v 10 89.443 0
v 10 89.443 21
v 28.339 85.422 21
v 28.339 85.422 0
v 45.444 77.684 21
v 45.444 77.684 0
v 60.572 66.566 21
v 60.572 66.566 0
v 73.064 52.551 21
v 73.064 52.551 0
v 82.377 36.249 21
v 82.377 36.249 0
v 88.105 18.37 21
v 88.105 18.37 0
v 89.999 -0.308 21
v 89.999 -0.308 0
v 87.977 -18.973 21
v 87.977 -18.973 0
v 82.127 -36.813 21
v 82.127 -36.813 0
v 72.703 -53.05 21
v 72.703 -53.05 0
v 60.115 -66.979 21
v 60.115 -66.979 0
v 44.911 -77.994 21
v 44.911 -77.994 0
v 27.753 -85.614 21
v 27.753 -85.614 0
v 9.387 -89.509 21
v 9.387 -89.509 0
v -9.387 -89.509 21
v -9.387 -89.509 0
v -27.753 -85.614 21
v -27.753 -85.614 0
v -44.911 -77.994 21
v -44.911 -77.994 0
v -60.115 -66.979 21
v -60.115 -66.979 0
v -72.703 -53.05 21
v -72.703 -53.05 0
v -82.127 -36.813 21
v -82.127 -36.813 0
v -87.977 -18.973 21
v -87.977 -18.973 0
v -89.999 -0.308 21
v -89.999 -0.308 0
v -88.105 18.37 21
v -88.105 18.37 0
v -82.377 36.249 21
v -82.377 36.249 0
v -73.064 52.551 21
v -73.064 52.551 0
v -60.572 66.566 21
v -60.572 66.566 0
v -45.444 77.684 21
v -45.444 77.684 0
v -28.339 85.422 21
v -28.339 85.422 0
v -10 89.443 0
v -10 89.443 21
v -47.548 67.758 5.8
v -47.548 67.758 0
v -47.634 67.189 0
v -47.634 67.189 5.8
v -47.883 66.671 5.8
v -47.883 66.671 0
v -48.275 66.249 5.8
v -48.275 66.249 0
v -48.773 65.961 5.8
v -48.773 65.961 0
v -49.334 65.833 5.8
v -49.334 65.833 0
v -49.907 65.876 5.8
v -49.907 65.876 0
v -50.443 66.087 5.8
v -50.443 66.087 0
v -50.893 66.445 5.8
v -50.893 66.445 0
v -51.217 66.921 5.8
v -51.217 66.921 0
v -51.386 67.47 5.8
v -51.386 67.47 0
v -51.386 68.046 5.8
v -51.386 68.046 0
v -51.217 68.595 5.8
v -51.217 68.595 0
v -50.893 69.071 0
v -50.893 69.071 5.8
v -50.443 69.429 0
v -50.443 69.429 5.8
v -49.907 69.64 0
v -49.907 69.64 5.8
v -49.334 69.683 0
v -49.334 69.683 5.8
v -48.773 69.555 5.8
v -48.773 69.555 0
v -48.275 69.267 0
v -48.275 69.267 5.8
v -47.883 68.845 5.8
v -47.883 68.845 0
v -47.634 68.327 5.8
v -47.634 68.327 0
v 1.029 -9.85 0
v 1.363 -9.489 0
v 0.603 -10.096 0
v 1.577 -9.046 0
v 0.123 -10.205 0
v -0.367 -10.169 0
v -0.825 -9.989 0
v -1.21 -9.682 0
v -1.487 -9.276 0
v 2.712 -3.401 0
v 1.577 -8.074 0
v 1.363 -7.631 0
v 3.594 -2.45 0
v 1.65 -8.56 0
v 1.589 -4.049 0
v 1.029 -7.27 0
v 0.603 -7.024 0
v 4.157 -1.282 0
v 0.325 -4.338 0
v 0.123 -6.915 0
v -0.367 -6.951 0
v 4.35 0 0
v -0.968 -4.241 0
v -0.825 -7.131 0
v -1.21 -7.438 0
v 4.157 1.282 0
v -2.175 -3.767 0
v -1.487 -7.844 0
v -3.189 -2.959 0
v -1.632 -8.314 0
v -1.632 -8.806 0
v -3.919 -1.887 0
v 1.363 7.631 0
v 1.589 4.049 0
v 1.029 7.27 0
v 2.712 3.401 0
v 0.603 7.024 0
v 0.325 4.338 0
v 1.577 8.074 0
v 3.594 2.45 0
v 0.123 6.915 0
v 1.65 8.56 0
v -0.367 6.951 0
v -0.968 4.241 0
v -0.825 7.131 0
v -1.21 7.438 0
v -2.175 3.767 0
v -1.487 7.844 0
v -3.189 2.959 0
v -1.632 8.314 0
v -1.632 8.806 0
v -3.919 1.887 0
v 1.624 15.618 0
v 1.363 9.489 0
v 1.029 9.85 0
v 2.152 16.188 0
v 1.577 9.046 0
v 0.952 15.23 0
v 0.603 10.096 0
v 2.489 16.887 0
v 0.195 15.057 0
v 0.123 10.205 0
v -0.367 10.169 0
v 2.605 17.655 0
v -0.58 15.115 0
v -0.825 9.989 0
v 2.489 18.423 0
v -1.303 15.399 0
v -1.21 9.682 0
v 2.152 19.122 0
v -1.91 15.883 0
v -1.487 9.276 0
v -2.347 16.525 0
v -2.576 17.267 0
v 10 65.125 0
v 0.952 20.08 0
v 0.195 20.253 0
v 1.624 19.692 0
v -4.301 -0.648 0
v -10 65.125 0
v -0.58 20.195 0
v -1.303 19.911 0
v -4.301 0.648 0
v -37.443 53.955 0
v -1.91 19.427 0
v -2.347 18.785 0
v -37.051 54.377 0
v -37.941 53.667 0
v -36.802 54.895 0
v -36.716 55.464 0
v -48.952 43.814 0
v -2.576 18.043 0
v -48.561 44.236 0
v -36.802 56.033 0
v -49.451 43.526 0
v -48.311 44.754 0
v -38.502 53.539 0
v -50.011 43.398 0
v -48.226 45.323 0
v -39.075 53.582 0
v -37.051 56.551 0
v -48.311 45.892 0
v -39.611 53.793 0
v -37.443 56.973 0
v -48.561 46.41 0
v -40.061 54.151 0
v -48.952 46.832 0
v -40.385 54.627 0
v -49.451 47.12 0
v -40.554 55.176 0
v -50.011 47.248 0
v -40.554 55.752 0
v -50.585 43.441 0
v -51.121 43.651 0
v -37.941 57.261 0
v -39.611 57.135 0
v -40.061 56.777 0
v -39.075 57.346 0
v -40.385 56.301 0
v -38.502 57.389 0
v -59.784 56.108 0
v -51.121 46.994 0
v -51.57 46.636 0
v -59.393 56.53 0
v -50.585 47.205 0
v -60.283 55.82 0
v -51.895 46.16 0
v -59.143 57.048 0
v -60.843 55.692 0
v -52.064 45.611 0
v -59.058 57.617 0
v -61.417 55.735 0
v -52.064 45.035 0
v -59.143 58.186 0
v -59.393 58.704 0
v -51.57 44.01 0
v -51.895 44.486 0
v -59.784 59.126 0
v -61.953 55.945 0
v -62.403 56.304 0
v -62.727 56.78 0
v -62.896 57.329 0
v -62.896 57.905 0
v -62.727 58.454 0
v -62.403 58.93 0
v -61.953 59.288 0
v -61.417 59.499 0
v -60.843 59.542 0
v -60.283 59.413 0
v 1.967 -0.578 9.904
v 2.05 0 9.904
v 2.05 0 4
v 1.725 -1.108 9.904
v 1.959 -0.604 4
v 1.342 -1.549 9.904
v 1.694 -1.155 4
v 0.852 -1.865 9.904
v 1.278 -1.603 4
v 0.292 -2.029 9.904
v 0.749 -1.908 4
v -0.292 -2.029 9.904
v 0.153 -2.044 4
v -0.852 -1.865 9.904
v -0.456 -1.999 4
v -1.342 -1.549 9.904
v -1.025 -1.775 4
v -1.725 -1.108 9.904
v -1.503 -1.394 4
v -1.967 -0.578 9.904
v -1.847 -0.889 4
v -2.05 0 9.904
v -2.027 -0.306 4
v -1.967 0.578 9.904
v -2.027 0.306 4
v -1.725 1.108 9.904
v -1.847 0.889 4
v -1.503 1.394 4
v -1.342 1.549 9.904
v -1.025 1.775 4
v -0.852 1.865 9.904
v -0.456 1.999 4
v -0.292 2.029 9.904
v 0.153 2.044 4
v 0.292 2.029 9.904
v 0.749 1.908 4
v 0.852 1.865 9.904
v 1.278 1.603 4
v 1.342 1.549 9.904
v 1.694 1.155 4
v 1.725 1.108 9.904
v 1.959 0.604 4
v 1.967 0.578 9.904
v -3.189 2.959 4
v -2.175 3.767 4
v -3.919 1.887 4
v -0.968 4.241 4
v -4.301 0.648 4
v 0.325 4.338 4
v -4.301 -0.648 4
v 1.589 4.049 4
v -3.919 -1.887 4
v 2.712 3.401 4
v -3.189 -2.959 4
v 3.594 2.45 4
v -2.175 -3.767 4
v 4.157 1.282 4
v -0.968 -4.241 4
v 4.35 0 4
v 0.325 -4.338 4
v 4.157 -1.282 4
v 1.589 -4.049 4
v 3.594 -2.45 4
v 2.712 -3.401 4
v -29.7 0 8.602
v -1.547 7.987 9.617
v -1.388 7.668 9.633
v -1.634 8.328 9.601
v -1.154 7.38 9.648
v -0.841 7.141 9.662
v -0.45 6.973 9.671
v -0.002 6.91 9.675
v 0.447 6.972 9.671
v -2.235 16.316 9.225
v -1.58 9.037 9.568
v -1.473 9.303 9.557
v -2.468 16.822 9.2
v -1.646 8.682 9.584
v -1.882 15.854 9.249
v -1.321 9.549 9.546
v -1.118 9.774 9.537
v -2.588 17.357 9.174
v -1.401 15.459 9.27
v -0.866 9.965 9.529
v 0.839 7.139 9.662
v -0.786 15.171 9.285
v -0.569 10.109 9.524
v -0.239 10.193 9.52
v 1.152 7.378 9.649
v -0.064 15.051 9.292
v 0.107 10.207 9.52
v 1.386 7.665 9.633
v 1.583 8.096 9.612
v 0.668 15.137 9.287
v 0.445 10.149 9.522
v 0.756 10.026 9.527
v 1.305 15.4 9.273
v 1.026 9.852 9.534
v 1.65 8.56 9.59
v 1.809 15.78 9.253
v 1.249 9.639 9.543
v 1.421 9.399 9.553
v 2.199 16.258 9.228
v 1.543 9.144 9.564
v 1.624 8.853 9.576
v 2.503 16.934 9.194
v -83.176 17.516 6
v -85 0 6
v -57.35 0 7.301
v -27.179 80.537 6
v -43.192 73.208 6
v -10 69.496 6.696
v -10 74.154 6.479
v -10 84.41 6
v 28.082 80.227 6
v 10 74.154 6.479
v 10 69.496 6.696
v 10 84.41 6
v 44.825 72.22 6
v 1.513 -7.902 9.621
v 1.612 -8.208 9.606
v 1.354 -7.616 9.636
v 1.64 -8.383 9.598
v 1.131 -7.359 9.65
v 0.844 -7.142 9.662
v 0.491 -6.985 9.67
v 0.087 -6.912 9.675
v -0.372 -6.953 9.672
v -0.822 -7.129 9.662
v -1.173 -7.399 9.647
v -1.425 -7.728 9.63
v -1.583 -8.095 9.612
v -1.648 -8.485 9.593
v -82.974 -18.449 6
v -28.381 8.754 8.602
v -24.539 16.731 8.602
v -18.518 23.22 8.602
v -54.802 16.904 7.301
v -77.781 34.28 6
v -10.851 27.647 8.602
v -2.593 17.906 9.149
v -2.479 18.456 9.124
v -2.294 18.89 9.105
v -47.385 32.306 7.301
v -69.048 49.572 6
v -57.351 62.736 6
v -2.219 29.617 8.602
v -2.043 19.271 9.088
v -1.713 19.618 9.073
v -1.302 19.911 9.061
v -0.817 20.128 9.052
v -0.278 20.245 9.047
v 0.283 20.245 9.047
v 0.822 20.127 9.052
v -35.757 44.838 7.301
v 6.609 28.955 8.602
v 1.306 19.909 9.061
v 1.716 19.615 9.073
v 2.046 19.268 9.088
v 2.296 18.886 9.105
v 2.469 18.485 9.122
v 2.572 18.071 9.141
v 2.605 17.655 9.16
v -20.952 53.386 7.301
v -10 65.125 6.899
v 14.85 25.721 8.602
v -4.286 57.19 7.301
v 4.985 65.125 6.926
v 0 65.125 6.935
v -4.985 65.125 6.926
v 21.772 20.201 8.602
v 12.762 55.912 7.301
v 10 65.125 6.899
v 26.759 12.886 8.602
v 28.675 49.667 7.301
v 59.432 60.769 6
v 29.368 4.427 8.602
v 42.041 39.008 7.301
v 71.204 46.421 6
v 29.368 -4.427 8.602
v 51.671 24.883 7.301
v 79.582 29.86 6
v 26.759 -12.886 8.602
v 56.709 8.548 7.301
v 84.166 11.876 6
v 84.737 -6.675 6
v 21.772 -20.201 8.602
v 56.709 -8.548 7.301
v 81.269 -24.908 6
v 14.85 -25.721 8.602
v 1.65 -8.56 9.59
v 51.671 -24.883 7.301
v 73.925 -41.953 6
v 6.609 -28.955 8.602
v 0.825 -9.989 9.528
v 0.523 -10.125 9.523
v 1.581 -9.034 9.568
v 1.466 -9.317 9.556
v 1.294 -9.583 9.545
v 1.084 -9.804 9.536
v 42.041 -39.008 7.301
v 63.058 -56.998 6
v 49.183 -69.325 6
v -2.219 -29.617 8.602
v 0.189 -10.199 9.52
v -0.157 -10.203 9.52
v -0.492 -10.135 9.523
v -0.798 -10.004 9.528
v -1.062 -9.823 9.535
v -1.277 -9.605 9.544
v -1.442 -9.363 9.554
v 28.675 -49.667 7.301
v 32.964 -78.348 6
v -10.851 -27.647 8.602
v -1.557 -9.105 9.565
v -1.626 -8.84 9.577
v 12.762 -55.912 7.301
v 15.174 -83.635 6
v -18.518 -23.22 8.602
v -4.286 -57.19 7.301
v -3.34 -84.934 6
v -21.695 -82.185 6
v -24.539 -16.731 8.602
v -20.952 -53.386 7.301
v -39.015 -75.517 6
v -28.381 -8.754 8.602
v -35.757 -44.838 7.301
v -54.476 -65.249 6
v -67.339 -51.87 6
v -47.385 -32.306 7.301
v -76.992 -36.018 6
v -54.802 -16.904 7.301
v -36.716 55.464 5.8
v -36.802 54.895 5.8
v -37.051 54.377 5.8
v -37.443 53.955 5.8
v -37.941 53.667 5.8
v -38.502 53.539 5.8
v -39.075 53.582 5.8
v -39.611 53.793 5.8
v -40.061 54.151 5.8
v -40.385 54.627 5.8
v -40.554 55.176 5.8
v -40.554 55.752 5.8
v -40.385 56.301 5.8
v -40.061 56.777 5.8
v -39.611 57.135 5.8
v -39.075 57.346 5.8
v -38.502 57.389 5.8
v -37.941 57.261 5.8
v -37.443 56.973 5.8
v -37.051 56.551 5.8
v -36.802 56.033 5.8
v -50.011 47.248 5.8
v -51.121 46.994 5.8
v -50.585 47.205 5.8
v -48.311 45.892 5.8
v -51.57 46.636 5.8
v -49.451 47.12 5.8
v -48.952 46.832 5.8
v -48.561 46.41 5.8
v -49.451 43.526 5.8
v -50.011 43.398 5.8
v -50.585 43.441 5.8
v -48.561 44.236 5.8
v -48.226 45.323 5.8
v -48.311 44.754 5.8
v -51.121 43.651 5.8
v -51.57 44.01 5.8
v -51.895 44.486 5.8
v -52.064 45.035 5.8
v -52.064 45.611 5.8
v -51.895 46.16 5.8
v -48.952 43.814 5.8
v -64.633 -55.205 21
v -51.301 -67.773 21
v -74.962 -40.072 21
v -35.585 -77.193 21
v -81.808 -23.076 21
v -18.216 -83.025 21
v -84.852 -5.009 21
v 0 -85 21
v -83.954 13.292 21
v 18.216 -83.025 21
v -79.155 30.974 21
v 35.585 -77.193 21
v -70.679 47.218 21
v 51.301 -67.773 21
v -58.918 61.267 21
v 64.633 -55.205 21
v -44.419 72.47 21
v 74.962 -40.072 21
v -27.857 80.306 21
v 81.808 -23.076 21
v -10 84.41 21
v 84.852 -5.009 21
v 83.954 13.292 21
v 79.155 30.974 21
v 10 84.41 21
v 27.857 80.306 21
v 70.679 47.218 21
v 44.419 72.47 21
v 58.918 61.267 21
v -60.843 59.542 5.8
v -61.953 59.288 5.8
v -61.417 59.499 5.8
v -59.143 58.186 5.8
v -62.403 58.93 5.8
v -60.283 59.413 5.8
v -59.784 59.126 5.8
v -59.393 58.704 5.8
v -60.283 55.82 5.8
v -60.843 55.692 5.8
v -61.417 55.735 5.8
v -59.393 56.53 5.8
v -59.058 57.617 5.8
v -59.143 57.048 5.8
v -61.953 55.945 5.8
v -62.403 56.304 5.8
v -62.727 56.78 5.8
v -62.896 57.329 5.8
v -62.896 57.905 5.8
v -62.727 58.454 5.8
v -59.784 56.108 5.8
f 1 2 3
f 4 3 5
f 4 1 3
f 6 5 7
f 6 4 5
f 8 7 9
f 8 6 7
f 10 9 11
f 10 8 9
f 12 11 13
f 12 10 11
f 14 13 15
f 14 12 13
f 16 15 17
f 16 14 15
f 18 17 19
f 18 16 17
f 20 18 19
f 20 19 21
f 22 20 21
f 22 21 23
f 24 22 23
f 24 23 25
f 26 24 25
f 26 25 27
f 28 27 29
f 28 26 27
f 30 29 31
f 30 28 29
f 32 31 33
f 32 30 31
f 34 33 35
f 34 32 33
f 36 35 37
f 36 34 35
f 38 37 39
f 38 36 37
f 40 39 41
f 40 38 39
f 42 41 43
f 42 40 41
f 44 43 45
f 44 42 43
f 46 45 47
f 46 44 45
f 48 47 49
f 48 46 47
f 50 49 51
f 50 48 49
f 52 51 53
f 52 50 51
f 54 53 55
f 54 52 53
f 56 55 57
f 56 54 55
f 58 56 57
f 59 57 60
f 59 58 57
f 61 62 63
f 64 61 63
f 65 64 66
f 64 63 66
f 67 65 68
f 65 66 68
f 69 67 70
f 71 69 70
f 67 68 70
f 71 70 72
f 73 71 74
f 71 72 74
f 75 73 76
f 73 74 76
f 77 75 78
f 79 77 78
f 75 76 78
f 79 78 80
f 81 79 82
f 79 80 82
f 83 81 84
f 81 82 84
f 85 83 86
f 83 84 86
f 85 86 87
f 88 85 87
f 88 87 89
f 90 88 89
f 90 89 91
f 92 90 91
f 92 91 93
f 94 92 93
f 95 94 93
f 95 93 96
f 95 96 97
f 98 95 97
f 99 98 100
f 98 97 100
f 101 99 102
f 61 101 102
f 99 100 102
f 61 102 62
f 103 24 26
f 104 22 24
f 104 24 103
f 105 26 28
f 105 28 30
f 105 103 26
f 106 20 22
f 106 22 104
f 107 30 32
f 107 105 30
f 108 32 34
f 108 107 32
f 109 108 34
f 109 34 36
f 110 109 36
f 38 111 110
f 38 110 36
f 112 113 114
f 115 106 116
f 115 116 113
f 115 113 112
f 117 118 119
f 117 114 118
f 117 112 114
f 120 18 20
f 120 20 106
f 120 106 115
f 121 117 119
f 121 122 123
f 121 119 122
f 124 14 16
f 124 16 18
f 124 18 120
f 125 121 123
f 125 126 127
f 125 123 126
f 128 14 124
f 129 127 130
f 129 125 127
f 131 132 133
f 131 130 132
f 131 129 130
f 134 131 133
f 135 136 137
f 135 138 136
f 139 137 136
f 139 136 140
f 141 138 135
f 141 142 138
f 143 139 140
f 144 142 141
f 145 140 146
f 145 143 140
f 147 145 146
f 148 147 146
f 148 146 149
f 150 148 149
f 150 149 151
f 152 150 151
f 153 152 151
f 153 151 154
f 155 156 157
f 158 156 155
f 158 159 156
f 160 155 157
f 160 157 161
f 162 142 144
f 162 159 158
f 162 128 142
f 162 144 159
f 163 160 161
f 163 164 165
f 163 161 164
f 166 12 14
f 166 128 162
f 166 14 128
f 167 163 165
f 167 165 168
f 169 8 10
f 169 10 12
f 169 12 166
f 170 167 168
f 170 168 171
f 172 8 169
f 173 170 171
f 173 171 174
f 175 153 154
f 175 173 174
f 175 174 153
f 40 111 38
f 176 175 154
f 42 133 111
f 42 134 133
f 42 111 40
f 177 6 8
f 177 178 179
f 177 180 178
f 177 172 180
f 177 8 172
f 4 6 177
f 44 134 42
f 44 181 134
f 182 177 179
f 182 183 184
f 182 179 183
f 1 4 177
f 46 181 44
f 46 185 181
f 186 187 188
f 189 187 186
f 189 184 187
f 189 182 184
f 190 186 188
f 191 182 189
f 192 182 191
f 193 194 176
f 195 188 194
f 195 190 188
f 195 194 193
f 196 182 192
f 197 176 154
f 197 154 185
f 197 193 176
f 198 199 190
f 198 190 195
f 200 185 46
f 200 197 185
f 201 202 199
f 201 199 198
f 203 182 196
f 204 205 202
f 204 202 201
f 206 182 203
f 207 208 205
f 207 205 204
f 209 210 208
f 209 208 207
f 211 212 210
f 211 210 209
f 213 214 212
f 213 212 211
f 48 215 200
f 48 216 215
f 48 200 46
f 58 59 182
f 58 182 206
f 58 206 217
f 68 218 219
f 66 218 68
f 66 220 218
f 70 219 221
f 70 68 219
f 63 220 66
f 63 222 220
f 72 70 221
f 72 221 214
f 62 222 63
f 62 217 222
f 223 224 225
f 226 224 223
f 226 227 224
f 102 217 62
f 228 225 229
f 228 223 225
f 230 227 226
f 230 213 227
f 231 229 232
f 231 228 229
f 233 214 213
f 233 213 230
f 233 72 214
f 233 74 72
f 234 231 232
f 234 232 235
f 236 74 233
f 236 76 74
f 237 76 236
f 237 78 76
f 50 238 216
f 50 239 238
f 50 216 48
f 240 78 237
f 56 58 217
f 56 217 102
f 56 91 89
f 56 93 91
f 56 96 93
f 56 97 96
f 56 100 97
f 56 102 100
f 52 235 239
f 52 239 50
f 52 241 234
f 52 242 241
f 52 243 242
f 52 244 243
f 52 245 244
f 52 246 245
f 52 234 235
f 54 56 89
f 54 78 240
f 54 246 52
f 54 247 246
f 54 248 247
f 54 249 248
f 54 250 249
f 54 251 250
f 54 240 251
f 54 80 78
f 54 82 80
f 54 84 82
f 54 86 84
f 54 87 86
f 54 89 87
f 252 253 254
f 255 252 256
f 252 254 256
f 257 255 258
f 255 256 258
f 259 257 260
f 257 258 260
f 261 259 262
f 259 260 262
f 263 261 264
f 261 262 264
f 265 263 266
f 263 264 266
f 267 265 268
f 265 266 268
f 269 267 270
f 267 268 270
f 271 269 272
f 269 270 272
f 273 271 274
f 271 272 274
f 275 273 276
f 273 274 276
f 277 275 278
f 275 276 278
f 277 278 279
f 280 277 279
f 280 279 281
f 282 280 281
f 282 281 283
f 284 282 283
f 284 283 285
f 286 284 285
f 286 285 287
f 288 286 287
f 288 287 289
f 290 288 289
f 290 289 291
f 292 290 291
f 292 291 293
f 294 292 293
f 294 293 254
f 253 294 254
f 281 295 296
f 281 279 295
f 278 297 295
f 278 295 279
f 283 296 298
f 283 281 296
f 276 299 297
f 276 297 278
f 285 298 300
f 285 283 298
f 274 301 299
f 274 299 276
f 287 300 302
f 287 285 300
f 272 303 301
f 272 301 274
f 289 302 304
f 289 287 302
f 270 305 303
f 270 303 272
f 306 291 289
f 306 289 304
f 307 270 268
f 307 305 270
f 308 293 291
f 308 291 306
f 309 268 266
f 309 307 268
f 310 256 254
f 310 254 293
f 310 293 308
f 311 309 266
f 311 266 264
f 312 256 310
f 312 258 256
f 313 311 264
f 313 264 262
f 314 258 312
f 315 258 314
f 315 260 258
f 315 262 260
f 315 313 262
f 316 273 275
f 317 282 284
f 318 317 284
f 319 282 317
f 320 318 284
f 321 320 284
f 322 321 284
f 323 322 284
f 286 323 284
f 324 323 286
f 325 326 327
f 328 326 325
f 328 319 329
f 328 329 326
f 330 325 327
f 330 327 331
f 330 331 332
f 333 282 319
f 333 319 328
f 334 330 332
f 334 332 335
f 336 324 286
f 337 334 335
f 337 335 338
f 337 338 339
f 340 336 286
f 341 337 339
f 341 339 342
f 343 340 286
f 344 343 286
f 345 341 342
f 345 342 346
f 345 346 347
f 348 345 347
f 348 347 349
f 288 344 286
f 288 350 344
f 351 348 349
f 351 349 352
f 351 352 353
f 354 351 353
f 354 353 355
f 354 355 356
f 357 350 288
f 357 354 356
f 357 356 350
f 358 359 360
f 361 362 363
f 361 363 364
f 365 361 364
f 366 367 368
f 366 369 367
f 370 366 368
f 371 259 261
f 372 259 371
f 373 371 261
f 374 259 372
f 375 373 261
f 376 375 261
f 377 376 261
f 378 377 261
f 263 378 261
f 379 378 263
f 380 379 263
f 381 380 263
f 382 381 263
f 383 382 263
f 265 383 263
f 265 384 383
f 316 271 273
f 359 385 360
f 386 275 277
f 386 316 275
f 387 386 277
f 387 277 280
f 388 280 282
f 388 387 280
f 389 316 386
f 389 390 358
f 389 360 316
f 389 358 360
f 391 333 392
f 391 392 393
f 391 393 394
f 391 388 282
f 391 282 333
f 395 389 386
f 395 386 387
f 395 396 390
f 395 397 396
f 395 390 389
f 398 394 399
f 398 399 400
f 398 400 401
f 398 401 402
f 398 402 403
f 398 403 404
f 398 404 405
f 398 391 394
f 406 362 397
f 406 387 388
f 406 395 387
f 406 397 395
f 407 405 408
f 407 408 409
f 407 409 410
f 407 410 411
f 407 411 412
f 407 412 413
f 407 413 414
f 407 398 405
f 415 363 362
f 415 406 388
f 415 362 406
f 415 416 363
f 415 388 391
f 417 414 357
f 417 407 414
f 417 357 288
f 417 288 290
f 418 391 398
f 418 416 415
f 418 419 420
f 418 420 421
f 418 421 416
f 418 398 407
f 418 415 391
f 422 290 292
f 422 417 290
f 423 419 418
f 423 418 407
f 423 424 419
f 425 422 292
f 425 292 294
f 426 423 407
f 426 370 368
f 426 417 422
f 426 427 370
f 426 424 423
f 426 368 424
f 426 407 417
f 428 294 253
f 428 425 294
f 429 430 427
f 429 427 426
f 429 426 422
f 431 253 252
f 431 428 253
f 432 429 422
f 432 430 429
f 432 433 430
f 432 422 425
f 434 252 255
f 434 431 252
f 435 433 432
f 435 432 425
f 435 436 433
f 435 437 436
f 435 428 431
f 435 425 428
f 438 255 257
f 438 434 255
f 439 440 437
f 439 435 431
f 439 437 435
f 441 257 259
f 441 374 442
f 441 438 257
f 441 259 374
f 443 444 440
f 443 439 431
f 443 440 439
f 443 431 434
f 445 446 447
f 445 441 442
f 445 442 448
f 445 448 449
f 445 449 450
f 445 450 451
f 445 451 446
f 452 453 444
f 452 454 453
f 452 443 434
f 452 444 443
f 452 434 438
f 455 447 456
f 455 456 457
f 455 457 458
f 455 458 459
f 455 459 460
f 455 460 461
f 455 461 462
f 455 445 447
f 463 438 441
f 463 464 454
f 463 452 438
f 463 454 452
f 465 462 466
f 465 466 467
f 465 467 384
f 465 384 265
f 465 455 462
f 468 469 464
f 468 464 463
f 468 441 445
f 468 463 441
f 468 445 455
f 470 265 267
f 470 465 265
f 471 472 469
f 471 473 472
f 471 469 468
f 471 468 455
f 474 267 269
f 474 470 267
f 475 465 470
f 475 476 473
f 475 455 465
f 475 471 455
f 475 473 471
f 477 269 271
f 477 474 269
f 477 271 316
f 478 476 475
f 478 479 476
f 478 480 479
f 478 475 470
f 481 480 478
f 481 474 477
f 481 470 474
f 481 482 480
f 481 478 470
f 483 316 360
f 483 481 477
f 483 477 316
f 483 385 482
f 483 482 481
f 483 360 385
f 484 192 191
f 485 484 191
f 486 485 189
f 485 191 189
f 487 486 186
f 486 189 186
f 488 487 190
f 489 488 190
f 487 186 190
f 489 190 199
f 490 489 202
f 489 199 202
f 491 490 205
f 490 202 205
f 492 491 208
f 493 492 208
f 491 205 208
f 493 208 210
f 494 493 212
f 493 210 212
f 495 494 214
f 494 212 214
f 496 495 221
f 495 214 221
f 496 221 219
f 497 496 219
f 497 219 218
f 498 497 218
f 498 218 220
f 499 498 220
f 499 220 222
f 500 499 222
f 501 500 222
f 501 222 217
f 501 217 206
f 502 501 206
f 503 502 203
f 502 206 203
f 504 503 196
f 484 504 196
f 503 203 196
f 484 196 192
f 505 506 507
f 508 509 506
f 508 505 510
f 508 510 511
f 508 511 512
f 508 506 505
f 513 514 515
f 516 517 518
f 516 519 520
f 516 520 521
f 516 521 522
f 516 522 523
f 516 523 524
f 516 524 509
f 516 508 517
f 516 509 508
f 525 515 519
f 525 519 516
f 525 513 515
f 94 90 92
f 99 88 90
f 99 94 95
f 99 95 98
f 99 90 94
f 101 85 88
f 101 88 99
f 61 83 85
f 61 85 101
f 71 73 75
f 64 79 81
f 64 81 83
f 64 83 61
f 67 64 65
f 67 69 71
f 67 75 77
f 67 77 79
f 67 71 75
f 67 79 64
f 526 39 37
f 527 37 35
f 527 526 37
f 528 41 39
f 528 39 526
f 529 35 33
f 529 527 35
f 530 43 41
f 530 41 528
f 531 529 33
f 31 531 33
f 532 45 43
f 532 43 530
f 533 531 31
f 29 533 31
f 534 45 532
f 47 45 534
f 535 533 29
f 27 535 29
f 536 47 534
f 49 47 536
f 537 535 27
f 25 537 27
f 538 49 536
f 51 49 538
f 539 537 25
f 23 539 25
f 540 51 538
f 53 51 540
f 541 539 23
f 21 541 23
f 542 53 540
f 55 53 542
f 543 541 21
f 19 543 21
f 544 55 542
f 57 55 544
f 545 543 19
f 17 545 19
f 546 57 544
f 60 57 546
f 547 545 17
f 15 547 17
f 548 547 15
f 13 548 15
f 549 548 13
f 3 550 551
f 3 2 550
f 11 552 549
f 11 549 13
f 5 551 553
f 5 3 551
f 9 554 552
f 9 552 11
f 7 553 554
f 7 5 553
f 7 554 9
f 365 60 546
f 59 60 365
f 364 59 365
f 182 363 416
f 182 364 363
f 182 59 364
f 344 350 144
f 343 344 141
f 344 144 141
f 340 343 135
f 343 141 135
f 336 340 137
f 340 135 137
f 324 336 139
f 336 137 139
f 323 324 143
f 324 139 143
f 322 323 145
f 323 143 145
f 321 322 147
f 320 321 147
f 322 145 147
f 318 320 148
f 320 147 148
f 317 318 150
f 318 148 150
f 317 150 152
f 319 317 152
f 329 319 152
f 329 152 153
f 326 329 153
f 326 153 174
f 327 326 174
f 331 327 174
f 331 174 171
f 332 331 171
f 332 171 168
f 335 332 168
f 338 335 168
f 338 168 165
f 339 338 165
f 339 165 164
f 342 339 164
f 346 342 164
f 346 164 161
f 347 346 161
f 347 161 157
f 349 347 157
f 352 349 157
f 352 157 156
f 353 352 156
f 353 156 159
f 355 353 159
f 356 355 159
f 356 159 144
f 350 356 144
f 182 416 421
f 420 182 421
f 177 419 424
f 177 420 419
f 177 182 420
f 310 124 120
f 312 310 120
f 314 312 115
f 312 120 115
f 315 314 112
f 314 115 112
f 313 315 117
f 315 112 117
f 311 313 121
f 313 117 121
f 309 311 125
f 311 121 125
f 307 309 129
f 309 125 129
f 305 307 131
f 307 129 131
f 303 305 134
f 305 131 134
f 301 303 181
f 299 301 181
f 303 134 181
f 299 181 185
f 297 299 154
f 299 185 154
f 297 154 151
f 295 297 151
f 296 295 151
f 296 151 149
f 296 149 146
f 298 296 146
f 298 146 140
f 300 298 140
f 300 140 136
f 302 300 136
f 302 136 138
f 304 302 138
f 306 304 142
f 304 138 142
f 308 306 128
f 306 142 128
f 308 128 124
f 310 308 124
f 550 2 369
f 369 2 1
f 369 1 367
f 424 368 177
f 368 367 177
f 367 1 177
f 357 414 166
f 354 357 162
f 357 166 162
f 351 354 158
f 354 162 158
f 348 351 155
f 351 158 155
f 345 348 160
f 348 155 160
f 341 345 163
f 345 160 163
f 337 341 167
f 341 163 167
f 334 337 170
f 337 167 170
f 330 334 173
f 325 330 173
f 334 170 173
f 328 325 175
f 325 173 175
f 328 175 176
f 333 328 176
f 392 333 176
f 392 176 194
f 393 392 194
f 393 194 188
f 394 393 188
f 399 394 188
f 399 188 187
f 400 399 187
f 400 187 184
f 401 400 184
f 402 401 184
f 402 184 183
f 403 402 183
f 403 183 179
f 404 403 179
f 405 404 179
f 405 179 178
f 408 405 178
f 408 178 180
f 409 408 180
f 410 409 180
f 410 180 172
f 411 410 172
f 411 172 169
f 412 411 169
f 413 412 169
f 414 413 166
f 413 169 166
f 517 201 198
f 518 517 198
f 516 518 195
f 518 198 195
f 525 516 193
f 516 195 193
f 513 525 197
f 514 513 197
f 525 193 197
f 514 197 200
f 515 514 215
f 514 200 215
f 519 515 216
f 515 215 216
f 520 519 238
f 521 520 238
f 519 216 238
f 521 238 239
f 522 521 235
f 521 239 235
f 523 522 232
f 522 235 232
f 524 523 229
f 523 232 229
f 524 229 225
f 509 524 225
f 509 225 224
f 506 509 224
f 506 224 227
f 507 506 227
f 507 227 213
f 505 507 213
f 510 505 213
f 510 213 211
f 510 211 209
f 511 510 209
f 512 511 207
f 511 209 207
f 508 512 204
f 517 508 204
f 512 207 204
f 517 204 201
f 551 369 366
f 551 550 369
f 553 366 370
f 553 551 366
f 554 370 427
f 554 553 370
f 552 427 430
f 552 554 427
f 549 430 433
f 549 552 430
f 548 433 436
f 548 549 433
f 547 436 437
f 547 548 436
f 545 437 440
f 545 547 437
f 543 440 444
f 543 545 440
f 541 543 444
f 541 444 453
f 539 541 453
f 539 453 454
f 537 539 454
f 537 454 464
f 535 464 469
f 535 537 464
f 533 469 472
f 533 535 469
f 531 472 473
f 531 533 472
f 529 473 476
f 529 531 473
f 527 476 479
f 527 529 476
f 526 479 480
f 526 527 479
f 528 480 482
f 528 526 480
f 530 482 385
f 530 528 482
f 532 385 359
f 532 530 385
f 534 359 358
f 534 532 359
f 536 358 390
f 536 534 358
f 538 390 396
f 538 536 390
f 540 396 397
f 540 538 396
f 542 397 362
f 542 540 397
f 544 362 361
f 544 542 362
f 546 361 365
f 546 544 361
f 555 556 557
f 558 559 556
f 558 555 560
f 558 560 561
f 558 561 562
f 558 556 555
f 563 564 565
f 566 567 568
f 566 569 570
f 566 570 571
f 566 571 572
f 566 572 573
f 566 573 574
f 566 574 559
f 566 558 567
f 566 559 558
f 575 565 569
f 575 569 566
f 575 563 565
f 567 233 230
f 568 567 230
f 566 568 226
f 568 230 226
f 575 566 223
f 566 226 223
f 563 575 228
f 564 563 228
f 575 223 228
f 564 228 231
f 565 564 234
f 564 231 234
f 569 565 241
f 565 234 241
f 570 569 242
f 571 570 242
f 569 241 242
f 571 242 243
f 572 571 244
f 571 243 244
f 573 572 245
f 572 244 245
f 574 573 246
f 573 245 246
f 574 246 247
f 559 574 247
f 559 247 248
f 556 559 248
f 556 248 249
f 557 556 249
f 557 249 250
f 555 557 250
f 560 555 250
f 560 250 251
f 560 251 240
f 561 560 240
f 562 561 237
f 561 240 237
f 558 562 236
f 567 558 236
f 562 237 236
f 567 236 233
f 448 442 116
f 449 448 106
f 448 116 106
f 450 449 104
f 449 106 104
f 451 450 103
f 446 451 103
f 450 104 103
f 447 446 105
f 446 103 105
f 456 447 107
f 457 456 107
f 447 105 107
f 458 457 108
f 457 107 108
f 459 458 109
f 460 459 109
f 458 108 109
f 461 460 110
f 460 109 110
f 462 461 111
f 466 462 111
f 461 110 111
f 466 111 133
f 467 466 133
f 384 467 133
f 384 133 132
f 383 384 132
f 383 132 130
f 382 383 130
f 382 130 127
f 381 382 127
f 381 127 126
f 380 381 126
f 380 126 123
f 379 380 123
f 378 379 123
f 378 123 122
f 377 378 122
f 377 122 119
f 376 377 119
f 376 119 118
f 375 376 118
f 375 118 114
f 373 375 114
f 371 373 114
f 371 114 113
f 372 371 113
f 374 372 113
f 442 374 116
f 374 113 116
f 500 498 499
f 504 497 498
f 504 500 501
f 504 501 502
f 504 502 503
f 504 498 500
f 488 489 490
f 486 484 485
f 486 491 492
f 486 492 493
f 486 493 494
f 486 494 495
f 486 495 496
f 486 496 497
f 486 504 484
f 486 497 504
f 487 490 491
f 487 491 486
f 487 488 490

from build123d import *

# Parameters (mm, degrees)
F2_R       = 2.05
F3_DEPTH   = 20
F4_W       = 20
F4_H       = 25
F5_DEPTH   = 25
F6_R       = 1.93
F7_DEPTH   = 5.8
F8_R       = 2.605
F9_DEPTH   = 25
F10_R      = 4.35
F10_R_2    = 1.65
F11_DEPTH  = 4
F11_FACE_R = 1.65
F13_DEPTH  = 25
F14_ANGLE  = -90
F15_ANGLE  = -270


with BuildPart() as f1:
    # F0 (on Front) → F1 (revolve)
    with BuildSketch(Plane.XZ):
        Polygon((-90, 0), (0, 0), (0, 10), (-85, 6), (-85, 21), (-90, 21), align=None)
    revolve(axis=Axis((0, 0, -12.121966), (0, 0, -1)))

    # F2 (on face) → F3 (cut)
    with BuildSketch(Plane(origin=(0, 0, 0), x_dir=(1, 0, 0), z_dir=(0, 0, -1))):
        Circle(F2_R)
    extrude(amount=-F3_DEPTH, mode=Mode.SUBTRACT)

    # F4 (on face) → F5 (cut)
    with BuildSketch(Plane(origin=(0, 0, 0), x_dir=(1, 0, 0), z_dir=(0, 0, -1))):
        with Locations((0, -77.625006)):
            Rectangle(F4_W, F4_H)
    extrude(amount=-F5_DEPTH, mode=Mode.SUBTRACT)

    # F6 (on face) → F7 (cut)
    with BuildSketch(Plane(origin=(0, 0, 0), x_dir=(1, 0, 0), z_dir=(0, 0, -1))):
        with Locations((-49.477956, -67.757965)):
            Circle(F6_R)
        with Locations((-50.155689, -45.322918)):
            Circle(F6_R)
        with Locations((-60.987717, -57.61691)):
            Circle(F6_R)
        with Locations((-38.645928, -55.463973)):
            Circle(F6_R)
    extrude(amount=-F7_DEPTH, mode=Mode.SUBTRACT)

    # F8 (on face) → F9 (cut)
    with BuildSketch(Plane(origin=(0, 0, 0), x_dir=(1, 0, 0), z_dir=(0, 0, -1))):
        with Locations((0, -17.655)):
            Circle(F8_R)
    extrude(amount=-F9_DEPTH, mode=Mode.SUBTRACT)

    # F10 (on face) → F11 (cut)
    with BuildSketch(Plane(origin=(0, 0, 0), x_dir=(1, 0, 0), z_dir=(0, 0, -1))):
        Circle(F10_R)
        with Locations((0, -8.56)):
            Circle(F10_R_2)
        with Locations((0, 8.56)):
            Circle(F10_R_2)
    extrude(amount=-F11_DEPTH, mode=Mode.SUBTRACT)

    # F11_face (on face) → F13 (cut)
    with BuildSketch(Plane(origin=(0, -8.56, 4), x_dir=(1, 0, 0), z_dir=(0, 0, -1))):
        Circle(F11_FACE_R)
        with Locations((0, -17.12)):
            Circle(F11_FACE_R)
    extrude(amount=-F13_DEPTH, mode=Mode.SUBTRACT)


with BuildPart() as f1_1:
    # F14: moved
    add(f1.part.rotate(Axis((-0.498306, 0, 0), (1, 0, 0)), F14_ANGLE))


with BuildPart() as f1_2:
    # F15: moved
    add(f1_1.part.rotate(Axis((-0.498306, 0, 0), (1, 0, 0)), F15_ANGLE))


solid = f1_2.part
